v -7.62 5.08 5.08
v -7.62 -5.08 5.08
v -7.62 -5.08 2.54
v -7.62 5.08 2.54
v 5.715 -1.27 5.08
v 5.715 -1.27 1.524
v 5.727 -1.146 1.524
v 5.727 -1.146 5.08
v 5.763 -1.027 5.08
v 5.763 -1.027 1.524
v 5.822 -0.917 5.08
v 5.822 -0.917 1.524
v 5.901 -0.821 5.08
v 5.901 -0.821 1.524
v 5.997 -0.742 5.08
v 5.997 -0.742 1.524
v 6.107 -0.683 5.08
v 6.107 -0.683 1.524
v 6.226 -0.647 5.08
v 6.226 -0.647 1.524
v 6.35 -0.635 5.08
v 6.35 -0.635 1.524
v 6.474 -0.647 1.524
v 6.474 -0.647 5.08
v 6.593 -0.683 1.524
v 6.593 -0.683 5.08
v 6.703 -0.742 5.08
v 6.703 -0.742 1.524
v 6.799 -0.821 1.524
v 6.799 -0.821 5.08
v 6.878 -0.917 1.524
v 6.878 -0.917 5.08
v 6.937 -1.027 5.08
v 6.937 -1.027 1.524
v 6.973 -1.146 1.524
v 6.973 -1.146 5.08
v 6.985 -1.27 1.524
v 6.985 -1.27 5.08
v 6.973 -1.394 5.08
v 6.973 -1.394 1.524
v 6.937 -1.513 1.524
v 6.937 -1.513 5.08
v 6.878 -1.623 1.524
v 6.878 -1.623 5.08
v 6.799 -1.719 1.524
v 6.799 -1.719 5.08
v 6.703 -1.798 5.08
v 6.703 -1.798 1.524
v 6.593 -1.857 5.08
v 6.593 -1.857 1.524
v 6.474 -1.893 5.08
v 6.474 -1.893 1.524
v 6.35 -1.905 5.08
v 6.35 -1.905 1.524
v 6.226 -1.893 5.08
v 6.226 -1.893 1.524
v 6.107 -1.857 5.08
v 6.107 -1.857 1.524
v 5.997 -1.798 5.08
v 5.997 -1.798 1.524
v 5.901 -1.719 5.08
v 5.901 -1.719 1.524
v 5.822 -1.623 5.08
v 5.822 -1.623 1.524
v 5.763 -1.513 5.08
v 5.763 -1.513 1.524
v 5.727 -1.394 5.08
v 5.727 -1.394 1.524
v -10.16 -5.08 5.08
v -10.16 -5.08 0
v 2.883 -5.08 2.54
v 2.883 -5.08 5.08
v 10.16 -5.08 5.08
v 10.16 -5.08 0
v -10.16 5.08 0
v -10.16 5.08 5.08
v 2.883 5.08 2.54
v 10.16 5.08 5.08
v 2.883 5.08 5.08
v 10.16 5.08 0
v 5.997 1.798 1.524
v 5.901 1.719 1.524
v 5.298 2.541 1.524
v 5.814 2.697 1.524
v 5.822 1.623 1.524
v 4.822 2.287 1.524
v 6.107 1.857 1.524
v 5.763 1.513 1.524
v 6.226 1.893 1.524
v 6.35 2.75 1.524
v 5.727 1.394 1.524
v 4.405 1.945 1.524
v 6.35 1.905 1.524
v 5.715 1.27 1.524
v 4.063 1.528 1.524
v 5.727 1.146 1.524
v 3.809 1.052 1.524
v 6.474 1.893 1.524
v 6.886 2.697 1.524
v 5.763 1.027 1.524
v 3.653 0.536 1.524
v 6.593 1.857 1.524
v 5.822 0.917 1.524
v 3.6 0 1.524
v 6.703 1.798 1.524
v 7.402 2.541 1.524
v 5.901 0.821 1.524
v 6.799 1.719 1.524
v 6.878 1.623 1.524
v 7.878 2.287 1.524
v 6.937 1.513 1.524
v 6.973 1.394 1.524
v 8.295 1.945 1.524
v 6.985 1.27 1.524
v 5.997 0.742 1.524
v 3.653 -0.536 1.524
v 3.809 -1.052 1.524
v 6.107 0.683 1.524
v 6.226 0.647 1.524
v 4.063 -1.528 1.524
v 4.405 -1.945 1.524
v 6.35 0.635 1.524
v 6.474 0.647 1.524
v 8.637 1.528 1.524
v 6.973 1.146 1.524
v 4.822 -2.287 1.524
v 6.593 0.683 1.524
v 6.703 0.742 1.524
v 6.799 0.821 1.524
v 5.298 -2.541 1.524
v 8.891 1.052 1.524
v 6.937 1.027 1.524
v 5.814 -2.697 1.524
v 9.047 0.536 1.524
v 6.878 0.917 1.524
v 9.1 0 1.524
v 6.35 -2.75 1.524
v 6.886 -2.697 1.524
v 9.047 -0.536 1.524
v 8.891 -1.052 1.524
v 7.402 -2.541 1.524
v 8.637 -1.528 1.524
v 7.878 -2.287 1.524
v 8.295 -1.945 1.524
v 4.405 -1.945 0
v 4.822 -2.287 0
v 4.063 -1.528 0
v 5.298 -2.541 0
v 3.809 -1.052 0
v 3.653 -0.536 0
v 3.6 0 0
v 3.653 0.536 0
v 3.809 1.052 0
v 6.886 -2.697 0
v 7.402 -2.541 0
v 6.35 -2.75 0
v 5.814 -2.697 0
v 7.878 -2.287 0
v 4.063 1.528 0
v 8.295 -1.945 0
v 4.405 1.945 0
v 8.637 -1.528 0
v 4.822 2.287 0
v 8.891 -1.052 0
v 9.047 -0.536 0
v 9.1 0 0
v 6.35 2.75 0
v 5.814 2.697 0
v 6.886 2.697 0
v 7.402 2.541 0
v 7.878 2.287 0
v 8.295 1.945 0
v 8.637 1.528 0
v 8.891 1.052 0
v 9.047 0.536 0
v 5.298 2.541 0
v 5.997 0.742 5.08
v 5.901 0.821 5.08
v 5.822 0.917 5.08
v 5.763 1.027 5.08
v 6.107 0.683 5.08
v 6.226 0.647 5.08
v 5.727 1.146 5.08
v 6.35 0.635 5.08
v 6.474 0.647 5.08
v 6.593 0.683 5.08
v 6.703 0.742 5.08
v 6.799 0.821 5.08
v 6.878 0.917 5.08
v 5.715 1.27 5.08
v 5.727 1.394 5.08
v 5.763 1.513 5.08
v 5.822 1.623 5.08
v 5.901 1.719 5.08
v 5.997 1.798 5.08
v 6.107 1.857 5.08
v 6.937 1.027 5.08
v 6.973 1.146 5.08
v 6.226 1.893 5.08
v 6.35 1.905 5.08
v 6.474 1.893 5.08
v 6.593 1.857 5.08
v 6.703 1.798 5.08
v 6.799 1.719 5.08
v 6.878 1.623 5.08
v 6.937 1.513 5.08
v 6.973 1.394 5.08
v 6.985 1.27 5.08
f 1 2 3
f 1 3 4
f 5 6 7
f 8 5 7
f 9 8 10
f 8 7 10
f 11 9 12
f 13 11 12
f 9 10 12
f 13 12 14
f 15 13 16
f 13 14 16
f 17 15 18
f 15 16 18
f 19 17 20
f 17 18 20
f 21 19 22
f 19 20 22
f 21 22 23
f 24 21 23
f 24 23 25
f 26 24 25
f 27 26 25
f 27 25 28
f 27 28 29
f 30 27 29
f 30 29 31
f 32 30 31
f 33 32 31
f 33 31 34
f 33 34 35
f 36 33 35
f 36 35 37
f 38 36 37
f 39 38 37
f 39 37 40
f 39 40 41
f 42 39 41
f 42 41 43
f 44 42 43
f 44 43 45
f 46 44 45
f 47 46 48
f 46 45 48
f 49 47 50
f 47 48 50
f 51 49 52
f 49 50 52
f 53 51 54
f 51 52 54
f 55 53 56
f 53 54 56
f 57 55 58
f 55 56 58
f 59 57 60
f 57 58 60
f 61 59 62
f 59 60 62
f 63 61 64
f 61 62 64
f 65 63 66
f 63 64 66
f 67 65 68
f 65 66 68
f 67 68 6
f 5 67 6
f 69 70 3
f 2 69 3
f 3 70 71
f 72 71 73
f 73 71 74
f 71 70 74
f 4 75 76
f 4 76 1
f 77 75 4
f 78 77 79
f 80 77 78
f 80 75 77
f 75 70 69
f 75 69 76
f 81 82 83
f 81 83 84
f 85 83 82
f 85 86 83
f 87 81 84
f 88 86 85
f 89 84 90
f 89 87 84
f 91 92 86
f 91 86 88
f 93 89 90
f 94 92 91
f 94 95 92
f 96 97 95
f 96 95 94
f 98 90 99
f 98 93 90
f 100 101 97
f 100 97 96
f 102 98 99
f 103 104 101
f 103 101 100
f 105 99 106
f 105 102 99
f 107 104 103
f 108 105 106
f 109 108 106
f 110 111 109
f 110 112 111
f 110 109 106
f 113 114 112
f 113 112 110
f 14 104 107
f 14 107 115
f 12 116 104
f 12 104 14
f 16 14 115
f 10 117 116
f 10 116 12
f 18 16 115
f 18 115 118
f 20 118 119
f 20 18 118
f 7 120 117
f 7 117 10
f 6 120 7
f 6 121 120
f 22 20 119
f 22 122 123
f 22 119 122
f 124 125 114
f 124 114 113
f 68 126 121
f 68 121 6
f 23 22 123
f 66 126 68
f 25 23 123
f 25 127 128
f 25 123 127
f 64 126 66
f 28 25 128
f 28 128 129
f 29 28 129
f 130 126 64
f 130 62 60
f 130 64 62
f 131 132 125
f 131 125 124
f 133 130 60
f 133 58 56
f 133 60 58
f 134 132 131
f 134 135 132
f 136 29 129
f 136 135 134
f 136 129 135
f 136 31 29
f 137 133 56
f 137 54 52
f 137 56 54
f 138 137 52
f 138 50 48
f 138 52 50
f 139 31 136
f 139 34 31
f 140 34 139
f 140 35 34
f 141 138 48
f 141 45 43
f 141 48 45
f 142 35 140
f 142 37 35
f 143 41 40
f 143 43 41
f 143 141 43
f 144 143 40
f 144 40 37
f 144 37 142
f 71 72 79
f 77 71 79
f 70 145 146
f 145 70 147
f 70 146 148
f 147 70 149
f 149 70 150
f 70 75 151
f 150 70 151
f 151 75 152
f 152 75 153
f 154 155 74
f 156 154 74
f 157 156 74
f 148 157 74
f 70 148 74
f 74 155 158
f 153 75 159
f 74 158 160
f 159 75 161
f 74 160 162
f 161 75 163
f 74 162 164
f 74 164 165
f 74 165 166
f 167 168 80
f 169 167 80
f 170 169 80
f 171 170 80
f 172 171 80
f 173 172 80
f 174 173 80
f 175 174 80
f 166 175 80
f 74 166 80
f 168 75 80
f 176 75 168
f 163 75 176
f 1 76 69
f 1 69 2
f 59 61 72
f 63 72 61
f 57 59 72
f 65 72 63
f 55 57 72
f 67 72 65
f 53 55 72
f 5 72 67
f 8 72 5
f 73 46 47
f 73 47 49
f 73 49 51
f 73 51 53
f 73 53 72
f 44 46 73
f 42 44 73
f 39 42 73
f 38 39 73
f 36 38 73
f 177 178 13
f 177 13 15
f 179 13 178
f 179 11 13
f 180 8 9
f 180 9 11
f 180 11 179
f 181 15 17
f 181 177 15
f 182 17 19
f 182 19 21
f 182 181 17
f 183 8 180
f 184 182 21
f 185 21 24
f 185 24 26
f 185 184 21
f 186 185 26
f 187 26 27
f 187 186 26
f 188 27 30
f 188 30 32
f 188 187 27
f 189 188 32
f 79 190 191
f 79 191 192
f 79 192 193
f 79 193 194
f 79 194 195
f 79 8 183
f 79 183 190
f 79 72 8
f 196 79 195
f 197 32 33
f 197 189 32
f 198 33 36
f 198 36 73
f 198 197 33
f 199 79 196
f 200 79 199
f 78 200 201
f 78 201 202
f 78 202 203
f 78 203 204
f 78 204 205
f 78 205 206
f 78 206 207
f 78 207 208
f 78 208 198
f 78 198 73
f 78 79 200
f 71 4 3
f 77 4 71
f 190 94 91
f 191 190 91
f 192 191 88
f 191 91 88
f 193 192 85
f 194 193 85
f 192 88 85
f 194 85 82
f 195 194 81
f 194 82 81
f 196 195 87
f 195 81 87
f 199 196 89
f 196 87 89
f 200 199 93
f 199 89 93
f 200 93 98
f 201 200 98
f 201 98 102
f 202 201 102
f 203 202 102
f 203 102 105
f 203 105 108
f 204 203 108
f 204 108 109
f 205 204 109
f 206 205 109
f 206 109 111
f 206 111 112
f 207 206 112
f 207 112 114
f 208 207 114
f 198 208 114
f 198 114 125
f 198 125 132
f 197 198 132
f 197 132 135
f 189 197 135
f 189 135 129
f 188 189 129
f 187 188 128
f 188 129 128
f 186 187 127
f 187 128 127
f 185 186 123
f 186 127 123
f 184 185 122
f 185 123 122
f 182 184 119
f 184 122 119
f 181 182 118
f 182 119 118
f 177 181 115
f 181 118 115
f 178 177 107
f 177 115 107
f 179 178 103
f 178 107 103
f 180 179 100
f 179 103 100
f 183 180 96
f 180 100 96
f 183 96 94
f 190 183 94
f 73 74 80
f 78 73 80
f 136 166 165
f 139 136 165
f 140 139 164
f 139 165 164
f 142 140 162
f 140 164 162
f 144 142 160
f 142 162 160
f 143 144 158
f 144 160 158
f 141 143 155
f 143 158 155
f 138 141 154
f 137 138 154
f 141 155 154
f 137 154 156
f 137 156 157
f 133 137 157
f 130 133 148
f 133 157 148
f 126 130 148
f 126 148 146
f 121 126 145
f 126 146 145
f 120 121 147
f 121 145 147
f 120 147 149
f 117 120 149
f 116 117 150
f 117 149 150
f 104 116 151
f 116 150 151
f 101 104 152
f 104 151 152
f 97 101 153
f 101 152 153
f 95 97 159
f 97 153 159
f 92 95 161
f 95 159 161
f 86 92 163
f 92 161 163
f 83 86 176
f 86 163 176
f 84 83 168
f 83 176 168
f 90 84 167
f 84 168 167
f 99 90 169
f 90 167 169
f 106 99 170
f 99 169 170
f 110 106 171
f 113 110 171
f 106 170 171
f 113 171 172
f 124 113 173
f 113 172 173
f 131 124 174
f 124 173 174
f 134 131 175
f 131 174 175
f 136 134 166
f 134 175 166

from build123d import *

# Parameters (mm, degrees)
F0_W     = 20.32
F0_H     = 10.16
F1_DEPTH = 5.08
F2_W     = 10.5029
F2_H     = 10.16
F3_DEPTH = 2.54
F5_D     = 1.27
F7_R     = 2.75
F7_R_2   = 0.635
F8_DEPTH = 1.524


with BuildPart() as f1:
    # F0 (on Top) → F1 (new body)
    with BuildSketch(Plane.XY):
        Rectangle(F0_W, F0_H)
    extrude(amount=F1_DEPTH)

    # F2 (on face) → F3 (cut)
    with BuildSketch(Plane.XY.offset(5.08)):
        with Locations((-2.36855, 0)):
            Rectangle(F2_W, F2_H)
    extrude(amount=-F3_DEPTH, mode=Mode.SUBTRACT)

    # F5 (through all)
    with Locations(Plane.XY.offset(5.08)):
        with Locations((6.35, 1.27), (6.35, -1.27)):
            Hole(F5_D / 2)

    # F7 (on face) → F8 (cut)
    with BuildSketch(Plane(origin=(0, 0, 0), x_dir=(1, 0, 0), z_dir=(0, 0, -1))):
        with Locations((6.35, 0)):
            Circle(F7_R)
        with Locations((6.35, -1.27)):
            Circle(F7_R_2, mode=Mode.SUBTRACT)
        with Locations((6.35, 1.27)):
            Circle(F7_R_2, mode=Mode.SUBTRACT)
    extrude(amount=-F8_DEPTH, mode=Mode.SUBTRACT)


solid = f1.part
